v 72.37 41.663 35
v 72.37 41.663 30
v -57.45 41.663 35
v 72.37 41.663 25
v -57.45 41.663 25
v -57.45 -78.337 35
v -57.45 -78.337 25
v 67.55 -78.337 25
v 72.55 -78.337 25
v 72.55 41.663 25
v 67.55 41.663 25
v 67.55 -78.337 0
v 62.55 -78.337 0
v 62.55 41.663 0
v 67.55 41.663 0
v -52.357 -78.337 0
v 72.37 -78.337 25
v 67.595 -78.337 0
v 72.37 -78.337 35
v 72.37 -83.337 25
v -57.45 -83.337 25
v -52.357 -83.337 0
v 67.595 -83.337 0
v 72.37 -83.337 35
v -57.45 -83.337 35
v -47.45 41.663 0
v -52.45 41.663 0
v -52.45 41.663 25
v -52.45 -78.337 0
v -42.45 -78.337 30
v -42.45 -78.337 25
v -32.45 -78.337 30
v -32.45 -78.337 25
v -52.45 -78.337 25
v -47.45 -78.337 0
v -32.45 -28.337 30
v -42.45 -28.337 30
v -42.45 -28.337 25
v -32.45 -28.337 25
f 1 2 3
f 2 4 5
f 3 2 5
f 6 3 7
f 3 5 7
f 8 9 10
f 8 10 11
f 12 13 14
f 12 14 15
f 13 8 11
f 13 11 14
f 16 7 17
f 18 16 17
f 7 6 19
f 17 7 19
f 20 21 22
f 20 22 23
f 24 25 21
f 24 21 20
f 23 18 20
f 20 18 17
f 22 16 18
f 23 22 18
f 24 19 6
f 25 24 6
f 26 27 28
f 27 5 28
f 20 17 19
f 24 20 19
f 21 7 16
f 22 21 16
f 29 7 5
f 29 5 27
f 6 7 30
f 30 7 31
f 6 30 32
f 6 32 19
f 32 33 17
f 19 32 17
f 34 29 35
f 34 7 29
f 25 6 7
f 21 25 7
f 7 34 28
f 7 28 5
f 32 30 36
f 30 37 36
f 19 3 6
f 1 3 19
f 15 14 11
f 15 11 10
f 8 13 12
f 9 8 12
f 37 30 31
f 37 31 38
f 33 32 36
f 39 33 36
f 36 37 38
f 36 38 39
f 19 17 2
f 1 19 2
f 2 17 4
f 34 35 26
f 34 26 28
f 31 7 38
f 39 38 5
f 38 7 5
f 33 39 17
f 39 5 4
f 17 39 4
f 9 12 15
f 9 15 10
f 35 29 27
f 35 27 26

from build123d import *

# Parameters (mm, degrees)
F0_W      = 110
F0_H      = 120
F1_DEPTH  = 25
F2_W      = 110
F2_H      = 25
F3_DEPTH  = 120
F5_DEPTH  = 120
F6_DEPTH  = 120
F7_W      = 5
F7_H      = 120
F7_W_2    = 124.8197975755
F8_DEPTH  = 5
F9_W      = 10
F9_H      = 50
F10_DEPTH = 25
F11_W     = 10
F11_H     = 50
F12_DEPTH = 5
F14_DEPTH = 5


with BuildPart() as f1:
    # F0 (on Top) → F1 (new body)
    with BuildSketch(Plane.XY):
        with Locations((7.5504112244, -18.337418735)):
            Rectangle(F0_W, F0_H)
    extrude(amount=F1_DEPTH)

    # F2 (on face) → F3 (join)
    with BuildSketch(Plane.XZ.offset(78.337418735)):
        Polygon((-47.4495887756, 0), (-47.4495887756, 25), (-52.4495887756, 25), align=None)
        with Locations((7.5504112244, 12.5)):
            Rectangle(F2_W, F2_H)
        Polygon((67.5504112244, 25), (62.5504112244, 25), (62.5504112244, 0), align=None)
    extrude(amount=-F3_DEPTH)

    # F6 (cut): a face of the model
    f6_faces = [f1.faces().sort_by_distance(p)[0] for p in [
        (7.5504112244, -78.337418735, 12.6811594203),
    ]]
    extrude(f6_faces, amount=-F6_DEPTH, mode=Mode.SUBTRACT)


with BuildPart() as f5:
    # F4 (on face) → F5 (new body)
    with BuildSketch(Plane.XZ.offset(78.337418735)):
        Polygon((67.5504112244, 25), (62.5504112244, 0), (67.5504112244, 0), (72.5504112244, 25), align=None)
    extrude(amount=-F5_DEPTH)


with BuildPart() as f5b:
    # F4 (on face) → F5, piece 2 (new body)
    with BuildSketch(Plane.XZ.offset(78.337418735)):
        Polygon((-52.4495887756, 0), (-47.4495887756, 0), (-52.4495887756, 25), (-57.4495887756, 25), align=None)
    extrude(amount=-F5_DEPTH)


with BuildPart() as f8:
    # F7 (on face) → F8 (new body)
    with BuildSketch(Plane.XY.offset(25)):
        with Locations((-54.9495887756, -18.337418735)):
            Rectangle(F7_W, F7_H)
        with Locations((9.9603100121, -18.337418735)):
            Rectangle(F7_W_2, F7_H)
    extrude(amount=F8_DEPTH)

    # F9 (on face) → F10 (cut)
    with BuildSketch(Plane.XY.offset(30)):
        with Locations((-37.4495887756, -53.337418735)):
            Rectangle(F9_W, F9_H)
    extrude(amount=-F10_DEPTH, mode=Mode.SUBTRACT)

    # F11 (on face) → F12 (join)
    with BuildSketch(Plane.XY.offset(30)):
        with Locations((-37.4495887756, -53.337418735)):
            Rectangle(F11_W, F11_H)
        Polygon((-57.4495887756, 41.662581265), (-57.4495887756, -78.337418735), (-42.4495887756, -78.337418735), (-42.4495887756, -28.337418735), (-32.4495887756, -28.337418735), (-32.4495887756, -78.337418735), (72.3702087998, -78.337418735), (72.3702087998, 41.662581265), align=None)
    extrude(amount=F12_DEPTH)


with BuildPart() as f14:
    # F13 (on face) → F14 (new body)
    with BuildSketch(Plane.XZ.offset(78.337418735)):
        Polygon((72.3702087998, 35), (-57.4495887756, 35), (-57.4495887756, 25), (-42.4495887756, 25), (-42.4495887756, 30), (-32.4495887756, 30), (-32.4495887756, 25), (72.3702087998, 25), align=None)
        Polygon((-42.4495887756, 25), (-57.4495887756, 25), (-52.3566640913, 0), (67.5945058465, 0), (72.3702087998, 25), (-32.4495887756, 25), (-32.4495887756, 30), (-42.4495887756, 30), align=None)
    extrude(amount=F14_DEPTH)


solid = Compound([f5.part, f5b.part, f8.part, f14.part])
